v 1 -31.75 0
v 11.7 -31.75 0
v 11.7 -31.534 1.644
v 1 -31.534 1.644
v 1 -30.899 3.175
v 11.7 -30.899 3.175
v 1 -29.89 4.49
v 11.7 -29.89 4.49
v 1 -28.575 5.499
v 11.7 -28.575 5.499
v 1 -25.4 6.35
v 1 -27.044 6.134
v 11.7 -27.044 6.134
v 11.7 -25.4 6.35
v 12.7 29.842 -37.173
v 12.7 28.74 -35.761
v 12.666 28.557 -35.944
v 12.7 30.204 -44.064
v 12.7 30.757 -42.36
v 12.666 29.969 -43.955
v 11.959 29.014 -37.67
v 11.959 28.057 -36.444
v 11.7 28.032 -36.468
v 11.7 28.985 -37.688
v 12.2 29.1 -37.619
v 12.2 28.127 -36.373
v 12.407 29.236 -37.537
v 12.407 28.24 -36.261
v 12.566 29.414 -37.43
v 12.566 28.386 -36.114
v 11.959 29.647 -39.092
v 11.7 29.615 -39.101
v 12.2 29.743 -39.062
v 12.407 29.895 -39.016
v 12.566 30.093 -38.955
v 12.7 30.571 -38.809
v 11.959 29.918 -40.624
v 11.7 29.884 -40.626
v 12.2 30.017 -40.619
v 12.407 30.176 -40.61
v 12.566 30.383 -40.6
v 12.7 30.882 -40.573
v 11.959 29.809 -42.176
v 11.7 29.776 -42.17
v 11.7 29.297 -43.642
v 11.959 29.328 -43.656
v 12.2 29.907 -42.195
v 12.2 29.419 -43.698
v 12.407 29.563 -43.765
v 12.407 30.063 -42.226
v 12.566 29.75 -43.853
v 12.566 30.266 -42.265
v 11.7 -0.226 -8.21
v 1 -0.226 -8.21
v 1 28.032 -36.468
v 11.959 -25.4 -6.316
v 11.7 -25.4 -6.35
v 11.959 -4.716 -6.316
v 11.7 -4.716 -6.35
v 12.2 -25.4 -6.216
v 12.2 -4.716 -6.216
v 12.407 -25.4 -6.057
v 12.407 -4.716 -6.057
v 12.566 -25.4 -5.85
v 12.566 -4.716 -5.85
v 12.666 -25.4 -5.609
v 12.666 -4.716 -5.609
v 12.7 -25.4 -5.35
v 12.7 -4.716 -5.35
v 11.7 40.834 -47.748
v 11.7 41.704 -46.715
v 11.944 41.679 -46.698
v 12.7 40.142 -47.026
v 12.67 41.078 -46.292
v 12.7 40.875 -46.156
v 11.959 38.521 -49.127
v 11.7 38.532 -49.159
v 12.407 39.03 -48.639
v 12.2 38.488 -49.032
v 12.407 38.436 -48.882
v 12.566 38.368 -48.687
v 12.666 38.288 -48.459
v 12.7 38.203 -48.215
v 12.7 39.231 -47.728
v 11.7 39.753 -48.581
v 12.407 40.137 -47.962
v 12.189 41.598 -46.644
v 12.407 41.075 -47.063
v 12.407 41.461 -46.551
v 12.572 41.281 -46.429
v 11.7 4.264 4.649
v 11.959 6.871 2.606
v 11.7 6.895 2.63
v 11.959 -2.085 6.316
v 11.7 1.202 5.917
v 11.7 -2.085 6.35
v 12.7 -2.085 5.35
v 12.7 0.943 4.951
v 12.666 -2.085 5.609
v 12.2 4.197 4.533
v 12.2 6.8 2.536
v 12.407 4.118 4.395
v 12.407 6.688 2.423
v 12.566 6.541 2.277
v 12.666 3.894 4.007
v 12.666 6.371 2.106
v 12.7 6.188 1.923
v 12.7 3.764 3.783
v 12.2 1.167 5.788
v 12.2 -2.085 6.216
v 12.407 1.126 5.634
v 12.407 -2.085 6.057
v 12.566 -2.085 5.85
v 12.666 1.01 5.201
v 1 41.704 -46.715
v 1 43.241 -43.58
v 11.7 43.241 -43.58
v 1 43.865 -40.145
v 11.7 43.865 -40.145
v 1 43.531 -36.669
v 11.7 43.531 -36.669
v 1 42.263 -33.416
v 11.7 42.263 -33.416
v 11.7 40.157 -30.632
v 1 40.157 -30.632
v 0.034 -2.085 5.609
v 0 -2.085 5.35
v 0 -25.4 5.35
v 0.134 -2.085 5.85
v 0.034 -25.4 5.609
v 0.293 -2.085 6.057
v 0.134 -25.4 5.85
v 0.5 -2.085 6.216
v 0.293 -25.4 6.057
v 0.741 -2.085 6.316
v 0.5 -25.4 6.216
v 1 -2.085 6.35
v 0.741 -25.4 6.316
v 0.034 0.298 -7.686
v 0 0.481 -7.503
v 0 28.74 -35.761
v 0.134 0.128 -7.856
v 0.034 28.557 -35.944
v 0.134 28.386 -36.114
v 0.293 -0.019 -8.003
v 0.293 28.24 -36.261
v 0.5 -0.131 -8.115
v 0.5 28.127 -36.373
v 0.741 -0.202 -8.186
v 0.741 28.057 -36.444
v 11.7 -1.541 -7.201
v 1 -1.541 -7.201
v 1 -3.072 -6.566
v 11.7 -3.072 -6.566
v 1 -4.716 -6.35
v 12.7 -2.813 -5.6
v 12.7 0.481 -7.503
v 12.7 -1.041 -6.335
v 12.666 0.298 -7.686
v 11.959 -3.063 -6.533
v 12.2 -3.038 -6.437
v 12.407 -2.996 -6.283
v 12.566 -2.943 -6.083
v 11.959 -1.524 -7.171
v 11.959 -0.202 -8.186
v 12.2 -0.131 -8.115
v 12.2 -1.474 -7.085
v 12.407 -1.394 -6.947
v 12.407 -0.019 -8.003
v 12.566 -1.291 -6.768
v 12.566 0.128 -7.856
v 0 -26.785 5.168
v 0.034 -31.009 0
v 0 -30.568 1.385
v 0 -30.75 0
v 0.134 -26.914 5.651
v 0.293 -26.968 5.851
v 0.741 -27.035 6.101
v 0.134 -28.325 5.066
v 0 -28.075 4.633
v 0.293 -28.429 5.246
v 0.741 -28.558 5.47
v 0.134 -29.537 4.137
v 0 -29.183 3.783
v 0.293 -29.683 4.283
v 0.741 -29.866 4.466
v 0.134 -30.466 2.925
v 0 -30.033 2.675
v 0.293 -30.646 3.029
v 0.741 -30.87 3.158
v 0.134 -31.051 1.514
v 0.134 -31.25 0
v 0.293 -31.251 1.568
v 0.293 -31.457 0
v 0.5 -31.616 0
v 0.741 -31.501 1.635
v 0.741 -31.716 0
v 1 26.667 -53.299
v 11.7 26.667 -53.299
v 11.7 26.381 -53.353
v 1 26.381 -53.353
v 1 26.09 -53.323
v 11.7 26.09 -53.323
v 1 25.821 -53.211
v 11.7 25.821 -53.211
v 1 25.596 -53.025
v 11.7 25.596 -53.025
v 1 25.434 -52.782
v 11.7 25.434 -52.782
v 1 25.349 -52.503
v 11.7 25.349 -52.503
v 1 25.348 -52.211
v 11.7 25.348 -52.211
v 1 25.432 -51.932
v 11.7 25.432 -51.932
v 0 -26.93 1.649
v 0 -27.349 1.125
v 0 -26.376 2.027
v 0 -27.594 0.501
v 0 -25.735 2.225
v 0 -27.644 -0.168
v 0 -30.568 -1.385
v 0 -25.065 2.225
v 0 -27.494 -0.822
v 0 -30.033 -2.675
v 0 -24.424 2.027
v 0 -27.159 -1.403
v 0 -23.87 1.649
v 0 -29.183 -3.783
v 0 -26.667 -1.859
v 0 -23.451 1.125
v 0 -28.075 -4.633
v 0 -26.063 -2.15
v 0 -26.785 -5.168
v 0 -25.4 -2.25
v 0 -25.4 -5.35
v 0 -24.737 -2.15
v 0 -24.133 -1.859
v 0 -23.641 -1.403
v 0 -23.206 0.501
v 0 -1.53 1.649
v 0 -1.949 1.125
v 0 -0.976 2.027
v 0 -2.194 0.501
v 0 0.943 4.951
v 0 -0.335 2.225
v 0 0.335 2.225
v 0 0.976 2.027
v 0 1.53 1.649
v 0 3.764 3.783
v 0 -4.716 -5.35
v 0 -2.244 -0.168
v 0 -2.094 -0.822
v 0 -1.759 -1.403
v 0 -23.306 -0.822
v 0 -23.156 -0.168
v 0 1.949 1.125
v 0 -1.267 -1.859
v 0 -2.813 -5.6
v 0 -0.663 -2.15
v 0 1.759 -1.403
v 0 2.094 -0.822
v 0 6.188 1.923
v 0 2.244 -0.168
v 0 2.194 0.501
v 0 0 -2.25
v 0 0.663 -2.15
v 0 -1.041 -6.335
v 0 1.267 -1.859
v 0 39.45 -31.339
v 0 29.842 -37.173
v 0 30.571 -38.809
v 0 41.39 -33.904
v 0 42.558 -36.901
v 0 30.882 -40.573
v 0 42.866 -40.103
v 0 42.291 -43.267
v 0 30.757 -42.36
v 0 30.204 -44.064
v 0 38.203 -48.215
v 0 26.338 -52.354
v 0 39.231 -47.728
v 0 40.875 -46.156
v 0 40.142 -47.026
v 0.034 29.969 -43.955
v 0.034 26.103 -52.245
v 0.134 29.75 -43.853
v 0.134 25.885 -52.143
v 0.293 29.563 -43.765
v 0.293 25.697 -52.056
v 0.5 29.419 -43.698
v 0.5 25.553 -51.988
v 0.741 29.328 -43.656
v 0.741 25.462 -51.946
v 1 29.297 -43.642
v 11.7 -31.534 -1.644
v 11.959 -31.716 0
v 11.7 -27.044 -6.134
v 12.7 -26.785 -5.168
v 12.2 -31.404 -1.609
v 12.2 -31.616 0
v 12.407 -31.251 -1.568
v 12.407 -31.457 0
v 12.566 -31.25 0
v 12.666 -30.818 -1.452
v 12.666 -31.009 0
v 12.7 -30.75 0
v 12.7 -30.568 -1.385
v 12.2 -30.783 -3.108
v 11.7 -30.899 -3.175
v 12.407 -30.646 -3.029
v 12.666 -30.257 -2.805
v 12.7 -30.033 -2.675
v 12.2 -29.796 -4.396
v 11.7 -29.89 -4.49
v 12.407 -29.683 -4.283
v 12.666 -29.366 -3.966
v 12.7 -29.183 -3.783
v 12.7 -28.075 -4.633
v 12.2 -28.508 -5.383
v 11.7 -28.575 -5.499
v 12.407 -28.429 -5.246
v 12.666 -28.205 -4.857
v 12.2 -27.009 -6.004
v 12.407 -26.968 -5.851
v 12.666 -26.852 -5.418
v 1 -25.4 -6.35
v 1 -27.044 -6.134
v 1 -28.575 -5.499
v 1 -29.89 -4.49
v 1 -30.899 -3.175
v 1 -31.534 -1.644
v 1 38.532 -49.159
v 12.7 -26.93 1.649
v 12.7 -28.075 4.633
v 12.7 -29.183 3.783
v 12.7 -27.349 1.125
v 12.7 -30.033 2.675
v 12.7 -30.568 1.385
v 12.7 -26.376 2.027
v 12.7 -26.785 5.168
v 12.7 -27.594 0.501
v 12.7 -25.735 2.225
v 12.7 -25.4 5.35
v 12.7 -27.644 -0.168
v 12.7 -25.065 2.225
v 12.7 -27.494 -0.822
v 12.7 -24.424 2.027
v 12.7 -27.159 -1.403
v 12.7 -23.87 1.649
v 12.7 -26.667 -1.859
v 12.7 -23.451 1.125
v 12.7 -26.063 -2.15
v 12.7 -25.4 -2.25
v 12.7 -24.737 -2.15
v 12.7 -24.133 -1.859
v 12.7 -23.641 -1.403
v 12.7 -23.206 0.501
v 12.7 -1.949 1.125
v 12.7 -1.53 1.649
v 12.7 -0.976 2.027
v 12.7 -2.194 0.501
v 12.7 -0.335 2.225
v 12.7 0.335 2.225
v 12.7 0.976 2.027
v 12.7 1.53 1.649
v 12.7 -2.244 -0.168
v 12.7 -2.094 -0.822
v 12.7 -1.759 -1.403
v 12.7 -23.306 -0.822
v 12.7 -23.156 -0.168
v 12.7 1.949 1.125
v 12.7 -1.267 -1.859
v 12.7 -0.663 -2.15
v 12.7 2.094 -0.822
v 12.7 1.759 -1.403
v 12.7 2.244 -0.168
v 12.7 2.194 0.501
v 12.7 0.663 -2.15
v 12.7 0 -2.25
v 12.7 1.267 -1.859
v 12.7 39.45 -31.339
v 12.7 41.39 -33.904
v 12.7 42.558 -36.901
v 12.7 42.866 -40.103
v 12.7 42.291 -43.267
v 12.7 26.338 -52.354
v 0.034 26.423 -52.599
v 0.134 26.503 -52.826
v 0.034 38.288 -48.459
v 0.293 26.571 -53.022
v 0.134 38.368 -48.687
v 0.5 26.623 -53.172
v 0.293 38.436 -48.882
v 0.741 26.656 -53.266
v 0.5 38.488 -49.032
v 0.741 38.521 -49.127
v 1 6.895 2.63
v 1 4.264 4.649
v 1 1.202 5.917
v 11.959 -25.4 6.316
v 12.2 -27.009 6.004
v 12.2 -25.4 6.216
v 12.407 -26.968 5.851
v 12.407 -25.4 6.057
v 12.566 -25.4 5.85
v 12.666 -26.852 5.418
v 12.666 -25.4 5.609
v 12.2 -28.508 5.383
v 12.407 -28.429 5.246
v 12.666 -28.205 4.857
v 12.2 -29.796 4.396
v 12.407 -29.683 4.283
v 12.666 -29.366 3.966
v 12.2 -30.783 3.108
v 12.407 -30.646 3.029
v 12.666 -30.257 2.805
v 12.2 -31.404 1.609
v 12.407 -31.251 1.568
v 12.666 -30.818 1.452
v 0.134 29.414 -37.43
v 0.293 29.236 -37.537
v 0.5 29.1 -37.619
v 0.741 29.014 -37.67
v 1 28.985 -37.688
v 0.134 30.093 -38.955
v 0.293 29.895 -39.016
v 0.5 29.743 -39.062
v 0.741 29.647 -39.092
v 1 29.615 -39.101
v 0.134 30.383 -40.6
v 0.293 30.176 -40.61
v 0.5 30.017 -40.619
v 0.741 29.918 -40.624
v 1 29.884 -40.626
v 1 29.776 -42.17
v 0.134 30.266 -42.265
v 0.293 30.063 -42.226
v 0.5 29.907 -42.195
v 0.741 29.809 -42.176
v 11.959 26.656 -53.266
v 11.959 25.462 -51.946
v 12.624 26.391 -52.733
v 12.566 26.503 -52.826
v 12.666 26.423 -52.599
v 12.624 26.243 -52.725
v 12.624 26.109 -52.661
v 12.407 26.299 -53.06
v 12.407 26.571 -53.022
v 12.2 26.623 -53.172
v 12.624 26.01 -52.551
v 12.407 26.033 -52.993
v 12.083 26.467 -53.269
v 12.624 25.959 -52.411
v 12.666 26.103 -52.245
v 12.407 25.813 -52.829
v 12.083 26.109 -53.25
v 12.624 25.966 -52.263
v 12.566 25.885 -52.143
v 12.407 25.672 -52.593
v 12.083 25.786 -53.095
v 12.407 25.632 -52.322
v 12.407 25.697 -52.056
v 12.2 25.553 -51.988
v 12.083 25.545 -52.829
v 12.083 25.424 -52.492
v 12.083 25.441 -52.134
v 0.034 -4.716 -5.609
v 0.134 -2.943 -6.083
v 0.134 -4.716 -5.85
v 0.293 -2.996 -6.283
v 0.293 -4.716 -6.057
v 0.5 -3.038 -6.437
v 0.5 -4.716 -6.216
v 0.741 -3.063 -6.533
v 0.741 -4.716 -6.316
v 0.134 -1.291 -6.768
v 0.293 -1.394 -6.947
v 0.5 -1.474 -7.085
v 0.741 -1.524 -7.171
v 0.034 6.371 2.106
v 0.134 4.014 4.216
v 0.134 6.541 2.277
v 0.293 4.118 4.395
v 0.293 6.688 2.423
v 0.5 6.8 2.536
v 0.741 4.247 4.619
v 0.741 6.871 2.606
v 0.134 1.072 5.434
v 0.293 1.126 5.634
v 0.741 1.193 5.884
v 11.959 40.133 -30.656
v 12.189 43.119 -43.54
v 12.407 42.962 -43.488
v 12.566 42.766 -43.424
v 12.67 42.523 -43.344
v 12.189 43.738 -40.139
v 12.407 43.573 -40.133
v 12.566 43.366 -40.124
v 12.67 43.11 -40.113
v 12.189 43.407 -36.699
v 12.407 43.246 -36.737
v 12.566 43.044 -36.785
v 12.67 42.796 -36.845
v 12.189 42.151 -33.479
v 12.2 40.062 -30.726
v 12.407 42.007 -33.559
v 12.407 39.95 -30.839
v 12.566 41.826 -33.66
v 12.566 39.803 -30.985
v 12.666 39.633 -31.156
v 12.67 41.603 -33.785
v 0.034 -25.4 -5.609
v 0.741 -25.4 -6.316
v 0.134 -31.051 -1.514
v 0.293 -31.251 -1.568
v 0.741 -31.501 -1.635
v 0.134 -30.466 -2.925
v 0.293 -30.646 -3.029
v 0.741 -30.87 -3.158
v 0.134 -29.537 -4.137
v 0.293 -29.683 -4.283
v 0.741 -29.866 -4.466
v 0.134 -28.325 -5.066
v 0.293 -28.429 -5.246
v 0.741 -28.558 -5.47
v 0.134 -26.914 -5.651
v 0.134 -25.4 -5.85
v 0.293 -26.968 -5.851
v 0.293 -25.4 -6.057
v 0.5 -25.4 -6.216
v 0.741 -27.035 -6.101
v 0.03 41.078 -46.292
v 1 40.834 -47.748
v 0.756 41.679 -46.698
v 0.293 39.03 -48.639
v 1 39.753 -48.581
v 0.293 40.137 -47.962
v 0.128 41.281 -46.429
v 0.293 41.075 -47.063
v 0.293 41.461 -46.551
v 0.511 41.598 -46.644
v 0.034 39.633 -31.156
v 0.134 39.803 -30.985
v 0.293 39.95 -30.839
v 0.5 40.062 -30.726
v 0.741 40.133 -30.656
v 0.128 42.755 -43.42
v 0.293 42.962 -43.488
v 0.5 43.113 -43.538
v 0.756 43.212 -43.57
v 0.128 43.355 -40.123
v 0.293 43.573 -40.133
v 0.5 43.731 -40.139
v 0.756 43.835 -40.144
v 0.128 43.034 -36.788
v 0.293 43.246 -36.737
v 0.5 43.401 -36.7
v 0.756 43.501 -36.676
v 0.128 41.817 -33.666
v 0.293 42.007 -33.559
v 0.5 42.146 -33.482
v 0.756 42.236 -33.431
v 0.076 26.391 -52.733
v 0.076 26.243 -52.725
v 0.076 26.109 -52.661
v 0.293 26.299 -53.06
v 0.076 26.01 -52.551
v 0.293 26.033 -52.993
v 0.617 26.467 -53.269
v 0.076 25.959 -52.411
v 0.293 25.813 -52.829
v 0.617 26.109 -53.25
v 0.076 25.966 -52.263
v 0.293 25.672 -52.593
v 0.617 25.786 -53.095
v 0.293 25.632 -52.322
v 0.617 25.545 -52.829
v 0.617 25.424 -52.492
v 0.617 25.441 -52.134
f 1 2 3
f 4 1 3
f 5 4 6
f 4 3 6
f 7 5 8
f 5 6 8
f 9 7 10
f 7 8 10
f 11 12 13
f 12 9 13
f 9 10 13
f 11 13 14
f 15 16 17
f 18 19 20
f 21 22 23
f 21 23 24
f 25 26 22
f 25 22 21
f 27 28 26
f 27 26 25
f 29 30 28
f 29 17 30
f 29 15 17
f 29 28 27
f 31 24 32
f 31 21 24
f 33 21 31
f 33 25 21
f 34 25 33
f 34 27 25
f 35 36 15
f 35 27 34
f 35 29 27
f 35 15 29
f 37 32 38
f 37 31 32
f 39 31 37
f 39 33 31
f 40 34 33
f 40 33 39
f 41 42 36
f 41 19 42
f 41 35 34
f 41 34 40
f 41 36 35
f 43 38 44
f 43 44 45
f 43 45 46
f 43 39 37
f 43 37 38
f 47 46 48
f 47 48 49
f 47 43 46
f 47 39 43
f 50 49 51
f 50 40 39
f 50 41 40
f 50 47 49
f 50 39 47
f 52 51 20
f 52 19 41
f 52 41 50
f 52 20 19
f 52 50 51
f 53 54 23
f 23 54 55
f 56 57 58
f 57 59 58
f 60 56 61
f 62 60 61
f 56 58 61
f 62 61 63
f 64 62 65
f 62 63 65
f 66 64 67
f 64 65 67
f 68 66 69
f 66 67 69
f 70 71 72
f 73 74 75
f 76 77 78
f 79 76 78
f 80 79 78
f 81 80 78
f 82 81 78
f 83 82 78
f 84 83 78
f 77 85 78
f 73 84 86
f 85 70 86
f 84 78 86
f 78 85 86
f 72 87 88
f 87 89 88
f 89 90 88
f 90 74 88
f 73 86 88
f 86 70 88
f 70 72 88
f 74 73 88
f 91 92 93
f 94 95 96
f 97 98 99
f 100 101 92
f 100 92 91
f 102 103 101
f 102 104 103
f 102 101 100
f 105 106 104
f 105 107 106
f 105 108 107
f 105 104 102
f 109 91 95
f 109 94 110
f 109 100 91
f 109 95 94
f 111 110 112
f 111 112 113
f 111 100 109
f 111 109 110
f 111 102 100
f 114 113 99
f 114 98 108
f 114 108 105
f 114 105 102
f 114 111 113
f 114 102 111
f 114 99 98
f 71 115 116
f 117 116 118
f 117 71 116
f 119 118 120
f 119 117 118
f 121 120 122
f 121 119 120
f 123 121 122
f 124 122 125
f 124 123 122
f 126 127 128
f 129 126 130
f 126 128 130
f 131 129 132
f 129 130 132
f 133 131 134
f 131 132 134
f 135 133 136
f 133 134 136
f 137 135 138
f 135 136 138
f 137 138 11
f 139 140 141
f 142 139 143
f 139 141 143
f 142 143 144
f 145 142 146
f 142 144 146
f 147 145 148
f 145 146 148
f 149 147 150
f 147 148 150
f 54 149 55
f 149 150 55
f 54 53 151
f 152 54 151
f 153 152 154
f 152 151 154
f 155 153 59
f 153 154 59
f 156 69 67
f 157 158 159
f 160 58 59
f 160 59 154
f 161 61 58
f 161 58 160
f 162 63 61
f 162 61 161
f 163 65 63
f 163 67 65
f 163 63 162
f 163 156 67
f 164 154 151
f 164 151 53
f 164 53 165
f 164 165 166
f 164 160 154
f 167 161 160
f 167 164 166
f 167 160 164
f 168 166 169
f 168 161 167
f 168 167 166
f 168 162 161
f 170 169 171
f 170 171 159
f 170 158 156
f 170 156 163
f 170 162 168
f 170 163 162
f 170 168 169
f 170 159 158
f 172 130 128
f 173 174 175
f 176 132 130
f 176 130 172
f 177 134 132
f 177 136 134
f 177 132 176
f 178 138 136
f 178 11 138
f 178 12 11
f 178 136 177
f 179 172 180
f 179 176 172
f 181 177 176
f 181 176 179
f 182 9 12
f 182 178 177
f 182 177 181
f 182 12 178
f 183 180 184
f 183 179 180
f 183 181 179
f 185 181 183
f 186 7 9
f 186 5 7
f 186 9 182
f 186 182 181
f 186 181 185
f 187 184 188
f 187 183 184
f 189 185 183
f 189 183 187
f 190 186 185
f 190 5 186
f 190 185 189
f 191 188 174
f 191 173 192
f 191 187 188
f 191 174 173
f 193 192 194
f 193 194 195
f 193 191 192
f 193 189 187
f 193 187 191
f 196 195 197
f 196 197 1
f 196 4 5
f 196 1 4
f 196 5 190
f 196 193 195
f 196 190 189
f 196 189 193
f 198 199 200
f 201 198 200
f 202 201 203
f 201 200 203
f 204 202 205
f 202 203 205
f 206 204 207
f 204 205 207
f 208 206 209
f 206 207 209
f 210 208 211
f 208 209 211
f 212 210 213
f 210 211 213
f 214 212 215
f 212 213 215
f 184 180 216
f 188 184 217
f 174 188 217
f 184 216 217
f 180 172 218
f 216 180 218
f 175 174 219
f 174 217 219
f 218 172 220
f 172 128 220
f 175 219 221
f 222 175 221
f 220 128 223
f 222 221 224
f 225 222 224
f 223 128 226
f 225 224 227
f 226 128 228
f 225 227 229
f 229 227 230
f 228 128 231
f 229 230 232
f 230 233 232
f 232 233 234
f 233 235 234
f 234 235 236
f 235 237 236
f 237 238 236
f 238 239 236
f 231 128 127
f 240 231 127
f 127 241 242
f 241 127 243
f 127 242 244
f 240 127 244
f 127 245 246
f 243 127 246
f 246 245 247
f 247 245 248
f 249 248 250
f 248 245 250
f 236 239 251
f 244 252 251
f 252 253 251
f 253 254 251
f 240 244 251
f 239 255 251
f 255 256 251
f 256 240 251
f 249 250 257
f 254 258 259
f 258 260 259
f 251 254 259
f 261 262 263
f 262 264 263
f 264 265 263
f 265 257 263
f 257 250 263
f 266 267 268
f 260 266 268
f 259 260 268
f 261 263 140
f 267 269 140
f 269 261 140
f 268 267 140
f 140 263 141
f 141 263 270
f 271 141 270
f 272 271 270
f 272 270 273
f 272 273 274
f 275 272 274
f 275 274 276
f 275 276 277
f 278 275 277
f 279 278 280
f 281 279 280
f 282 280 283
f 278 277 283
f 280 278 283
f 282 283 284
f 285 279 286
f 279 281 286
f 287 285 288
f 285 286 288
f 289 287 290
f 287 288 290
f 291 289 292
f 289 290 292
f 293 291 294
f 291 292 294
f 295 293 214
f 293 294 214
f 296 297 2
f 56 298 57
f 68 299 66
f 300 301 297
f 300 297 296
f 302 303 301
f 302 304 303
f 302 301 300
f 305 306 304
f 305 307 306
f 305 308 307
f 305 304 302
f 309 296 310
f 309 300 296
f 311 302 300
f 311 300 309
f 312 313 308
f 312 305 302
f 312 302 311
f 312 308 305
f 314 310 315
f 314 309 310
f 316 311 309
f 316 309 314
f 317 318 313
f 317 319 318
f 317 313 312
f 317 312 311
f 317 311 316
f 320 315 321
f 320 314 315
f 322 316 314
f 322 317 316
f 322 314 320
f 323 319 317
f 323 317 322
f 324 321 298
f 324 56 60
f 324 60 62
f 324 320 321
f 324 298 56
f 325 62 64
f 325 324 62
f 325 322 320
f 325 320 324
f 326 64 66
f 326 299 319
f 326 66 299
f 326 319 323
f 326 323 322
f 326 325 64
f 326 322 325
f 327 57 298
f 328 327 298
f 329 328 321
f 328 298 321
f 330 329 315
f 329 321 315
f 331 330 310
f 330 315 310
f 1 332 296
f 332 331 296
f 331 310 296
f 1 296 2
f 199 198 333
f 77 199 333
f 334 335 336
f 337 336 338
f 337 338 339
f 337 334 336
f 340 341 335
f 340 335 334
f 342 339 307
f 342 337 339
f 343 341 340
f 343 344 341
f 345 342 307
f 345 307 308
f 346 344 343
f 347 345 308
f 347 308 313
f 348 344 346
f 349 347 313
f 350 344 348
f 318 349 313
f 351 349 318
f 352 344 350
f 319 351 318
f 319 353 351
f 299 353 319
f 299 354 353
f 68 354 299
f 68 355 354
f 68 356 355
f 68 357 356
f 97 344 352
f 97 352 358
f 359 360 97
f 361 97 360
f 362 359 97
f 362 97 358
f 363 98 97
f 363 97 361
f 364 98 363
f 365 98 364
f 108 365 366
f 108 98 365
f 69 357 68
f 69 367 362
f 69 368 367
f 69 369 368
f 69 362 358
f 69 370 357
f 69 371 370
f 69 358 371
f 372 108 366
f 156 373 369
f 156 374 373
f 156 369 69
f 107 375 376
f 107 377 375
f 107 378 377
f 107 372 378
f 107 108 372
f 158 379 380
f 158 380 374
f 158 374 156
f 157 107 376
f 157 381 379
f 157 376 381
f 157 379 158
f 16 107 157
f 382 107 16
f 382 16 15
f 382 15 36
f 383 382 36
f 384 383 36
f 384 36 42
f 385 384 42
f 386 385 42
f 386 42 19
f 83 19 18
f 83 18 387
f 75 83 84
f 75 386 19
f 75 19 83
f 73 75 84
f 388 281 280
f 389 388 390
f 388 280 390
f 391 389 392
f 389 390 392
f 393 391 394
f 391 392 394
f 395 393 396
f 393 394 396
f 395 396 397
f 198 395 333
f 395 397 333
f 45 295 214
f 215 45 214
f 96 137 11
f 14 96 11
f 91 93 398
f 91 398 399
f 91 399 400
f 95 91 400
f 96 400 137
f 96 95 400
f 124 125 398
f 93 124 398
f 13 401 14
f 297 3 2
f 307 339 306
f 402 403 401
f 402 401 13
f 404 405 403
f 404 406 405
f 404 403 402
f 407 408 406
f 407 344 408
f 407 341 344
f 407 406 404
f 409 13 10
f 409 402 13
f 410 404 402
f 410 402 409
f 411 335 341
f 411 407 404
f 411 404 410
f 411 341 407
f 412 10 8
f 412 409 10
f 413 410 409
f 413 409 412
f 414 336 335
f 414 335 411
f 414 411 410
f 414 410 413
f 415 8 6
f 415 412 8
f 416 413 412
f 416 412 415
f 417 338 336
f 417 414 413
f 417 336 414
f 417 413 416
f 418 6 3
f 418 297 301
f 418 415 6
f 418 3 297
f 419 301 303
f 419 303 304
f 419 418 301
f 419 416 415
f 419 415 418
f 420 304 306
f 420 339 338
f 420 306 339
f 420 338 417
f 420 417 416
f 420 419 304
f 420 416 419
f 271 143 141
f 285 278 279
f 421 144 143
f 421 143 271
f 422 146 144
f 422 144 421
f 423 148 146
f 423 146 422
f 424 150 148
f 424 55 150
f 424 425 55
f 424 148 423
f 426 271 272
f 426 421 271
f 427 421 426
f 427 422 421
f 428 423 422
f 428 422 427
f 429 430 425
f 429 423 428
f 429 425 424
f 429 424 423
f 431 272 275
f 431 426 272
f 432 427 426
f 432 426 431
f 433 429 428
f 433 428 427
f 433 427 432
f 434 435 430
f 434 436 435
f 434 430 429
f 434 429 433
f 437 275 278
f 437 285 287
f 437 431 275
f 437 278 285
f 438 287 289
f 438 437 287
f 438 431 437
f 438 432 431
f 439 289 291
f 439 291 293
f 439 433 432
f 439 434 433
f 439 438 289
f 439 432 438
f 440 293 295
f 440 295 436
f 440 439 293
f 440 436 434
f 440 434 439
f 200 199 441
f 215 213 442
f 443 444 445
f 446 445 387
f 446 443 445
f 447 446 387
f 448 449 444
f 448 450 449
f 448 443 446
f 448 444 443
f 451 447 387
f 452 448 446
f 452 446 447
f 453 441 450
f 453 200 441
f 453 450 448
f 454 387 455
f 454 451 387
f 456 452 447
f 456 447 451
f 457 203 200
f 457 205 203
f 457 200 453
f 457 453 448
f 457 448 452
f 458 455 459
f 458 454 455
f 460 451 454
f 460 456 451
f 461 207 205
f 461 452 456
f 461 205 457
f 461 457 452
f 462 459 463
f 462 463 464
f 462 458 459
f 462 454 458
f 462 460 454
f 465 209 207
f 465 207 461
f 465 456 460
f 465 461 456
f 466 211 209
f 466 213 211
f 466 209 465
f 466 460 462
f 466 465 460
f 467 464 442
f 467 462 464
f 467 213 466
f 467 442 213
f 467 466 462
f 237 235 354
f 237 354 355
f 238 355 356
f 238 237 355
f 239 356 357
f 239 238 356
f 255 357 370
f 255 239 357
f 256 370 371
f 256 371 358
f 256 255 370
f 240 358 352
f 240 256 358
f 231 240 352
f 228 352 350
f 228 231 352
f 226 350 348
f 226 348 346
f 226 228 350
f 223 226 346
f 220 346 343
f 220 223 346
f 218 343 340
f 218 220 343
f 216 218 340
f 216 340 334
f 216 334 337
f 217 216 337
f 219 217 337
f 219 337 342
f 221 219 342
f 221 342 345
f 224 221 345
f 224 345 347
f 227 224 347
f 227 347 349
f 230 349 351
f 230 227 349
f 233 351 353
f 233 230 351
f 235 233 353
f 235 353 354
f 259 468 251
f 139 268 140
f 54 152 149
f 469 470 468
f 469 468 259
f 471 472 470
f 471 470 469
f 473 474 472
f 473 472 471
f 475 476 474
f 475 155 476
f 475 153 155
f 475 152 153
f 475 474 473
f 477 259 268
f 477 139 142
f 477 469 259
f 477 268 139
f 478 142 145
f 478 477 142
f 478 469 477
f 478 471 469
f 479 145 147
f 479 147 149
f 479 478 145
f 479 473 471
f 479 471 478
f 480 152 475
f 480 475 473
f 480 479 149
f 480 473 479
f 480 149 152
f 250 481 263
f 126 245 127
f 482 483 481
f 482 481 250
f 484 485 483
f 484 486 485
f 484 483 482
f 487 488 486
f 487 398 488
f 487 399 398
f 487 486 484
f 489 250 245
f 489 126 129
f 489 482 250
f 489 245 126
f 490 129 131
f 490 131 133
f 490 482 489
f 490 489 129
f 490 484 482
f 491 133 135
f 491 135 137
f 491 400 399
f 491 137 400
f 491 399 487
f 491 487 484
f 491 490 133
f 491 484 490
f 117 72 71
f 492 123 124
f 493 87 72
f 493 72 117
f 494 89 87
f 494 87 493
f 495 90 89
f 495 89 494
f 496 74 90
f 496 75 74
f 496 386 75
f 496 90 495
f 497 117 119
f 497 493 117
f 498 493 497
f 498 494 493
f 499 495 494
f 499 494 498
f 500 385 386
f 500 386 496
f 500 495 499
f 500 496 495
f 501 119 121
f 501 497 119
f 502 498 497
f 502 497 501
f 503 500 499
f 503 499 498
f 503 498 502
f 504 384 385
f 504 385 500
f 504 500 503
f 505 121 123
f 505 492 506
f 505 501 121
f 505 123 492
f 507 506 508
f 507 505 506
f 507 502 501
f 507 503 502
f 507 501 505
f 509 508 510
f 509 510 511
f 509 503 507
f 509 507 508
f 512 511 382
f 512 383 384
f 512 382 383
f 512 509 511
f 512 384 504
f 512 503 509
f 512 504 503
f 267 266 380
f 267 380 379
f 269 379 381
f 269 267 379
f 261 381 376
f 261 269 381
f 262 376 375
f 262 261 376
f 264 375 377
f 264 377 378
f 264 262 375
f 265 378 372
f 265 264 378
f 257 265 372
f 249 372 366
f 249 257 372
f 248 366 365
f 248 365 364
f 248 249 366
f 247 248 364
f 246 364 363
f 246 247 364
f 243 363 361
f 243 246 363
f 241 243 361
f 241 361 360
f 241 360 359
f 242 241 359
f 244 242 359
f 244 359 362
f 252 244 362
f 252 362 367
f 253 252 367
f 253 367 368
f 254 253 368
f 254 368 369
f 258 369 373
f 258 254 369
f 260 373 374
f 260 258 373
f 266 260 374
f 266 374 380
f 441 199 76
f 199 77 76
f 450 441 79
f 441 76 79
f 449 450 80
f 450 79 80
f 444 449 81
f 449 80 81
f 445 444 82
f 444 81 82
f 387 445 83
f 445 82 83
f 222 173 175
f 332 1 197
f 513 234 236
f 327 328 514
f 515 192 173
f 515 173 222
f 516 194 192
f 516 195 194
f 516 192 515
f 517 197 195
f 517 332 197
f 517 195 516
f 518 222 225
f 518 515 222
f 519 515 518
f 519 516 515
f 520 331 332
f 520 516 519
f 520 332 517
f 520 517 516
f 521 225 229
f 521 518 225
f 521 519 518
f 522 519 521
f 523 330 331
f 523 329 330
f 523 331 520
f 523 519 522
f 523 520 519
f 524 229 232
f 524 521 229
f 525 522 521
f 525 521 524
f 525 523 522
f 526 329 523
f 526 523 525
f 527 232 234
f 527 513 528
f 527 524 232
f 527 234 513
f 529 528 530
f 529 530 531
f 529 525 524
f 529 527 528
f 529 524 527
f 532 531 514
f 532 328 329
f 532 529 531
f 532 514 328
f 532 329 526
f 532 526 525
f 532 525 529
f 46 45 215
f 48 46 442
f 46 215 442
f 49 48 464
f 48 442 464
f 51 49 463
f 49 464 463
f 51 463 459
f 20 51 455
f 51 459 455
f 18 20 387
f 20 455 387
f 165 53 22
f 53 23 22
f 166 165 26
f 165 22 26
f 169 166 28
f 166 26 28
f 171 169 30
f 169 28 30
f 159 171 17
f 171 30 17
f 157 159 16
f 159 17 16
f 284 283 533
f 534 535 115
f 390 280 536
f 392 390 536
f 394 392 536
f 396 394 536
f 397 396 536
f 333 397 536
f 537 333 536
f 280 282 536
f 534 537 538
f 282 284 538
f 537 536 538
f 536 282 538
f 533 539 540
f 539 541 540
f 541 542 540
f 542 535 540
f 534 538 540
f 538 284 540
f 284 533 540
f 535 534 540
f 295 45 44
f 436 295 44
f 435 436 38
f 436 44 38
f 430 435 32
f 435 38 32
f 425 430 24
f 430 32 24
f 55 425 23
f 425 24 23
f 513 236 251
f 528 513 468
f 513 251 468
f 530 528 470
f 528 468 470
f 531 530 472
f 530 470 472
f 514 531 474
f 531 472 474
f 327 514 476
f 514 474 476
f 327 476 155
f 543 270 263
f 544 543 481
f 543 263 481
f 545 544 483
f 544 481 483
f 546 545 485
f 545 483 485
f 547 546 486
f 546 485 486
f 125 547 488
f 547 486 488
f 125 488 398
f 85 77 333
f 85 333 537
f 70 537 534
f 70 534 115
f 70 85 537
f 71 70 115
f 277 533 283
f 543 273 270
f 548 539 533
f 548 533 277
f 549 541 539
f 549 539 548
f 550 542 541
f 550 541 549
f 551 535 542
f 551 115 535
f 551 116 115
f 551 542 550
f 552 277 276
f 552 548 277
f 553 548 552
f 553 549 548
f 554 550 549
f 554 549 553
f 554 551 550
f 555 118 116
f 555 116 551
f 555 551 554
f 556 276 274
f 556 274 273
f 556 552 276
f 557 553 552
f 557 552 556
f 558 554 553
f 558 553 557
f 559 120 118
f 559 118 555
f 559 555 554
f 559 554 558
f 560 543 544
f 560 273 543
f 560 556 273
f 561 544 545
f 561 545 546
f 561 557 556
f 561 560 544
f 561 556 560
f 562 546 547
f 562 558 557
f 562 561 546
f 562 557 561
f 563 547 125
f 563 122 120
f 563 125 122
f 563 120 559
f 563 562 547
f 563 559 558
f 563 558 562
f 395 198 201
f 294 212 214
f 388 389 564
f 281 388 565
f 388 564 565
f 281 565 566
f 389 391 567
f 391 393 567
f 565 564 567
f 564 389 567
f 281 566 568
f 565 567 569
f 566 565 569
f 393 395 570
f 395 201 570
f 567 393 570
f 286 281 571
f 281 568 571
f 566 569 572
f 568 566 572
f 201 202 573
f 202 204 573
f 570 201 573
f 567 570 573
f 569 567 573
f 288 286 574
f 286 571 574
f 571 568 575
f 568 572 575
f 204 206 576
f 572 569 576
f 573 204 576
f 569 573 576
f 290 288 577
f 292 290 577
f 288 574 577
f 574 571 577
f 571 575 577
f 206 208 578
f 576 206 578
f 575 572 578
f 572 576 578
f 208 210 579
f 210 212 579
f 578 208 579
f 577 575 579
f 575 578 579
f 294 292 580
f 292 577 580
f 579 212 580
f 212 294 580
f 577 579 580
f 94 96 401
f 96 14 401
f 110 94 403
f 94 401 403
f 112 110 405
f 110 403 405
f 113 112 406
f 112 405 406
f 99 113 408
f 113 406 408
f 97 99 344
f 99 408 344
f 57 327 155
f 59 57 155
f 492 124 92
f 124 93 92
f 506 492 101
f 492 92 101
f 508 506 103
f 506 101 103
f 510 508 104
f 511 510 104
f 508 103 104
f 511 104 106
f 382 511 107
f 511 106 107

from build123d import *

# Parameters (mm, degrees)
SKETCH1_R           = 2.25
BOSS_EXTRUDE1_DEPTH = 12.7
FILLET1_R           = 12.7
FILLET2_R           = 6.35
FILLET3_R           = 1


with BuildPart() as part:
    # Sketch1 → Boss-Extrude1 (new body)
    # profile 1 of 2: a face of its own
    with BuildSketch(Plane(origin=(0, 0, 0), x_dir=(0, 0, -1), z_dir=(1, 0, 0))):
        Polygon((48.592196898, 40.156684656), (39.611940777, 49.136940777), (-6.35, 3.175), (-6.35, -31.75), (6.35, -31.75), (6.35, -2.085512242), align=None)
        with Locations((0, -25.4)):
            Circle(SKETCH1_R, mode=Mode.SUBTRACT)
        Circle(SKETCH1_R, mode=Mode.SUBTRACT)
    # profile 2 of 2: a face of its own
    with BuildSketch(Plane(origin=(0, 0, 0), x_dir=(0, 0, -1), z_dir=(1, 0, 0))):
        Polygon((54.079029807, 24.430314129), (48.592196898, 40.156684656), (39.611940777, 31.176428535), align=None)
    extrude(amount=BOSS_EXTRUDE1_DEPTH)

    # Fillet1
    fillet1_edges = [part.edges().sort_by_distance(p)[0] for p in [
        (6.35, 3.175, 6.35),
        (6.35, 49.136940777, -39.611940777),
    ]]
    fillet(fillet1_edges, radius=FILLET1_R - 0.0001)  # a hair under: the kernel refuses the full size

    # Fillet2
    fillet2_edges = [part.edges().sort_by_distance(p)[0] for p in [
        (6.35, 31.176428535, -39.611940777),
        (6.35, -2.085512242, -6.35),
    ]]
    fillet(fillet2_edges, radius=FILLET2_R)
    fillet2_2_edges = [part.edges().sort_by_distance(p)[0] for p in [
        (6.35, 40.156684656, -48.592196898),
        (6.35, -31.75, 6.35),
        (6.35, -31.75, -6.35),
    ]]
    fillet(fillet2_2_edges, radius=FILLET2_R - 0.0004)  # a hair under: the kernel refuses the full size

    # Fillet3
    fillet3_edges = [part.edges().sort_by_distance(p)[0] for p in [
        (0, 26.863823768, -48.860351546),
        (6.35, 24.430314129, -54.079029807),
        (0, -13.74293541, 6.35),
        (12.7, -13.74293541, 6.35),
        (0, 23.525734978, -14.000734978),
        (0, 43.818086311, -38.395583818),
        (0, 2.774570502, 5.383277675),
        (12.7, 23.525734978, -14.000734978),
        (12.7, 2.774570502, 5.383277675),
        (12.7, 43.818086311, -38.395583818),
        (0, 31.48135692, -51.618964812),
        (0, 13.903383358, -22.338895601),
        (12.7, 26.863823768, -48.860351546),
        (0, -15.058084182, -6.35),
        (0, -29.890245218, -4.490245218),
        (0, -29.890245218, 4.490245218),
        (0, 40.316018936, -48.193567347),
        (12.7, 31.48135692, -51.618964812),
        (12.7, -15.058084182, -6.35),
        (12.7, 13.903383358, -22.338895601),
        (12.7, -29.890245218, -4.490245218),
        (12.7, -29.890245218, 4.490245218),
        (12.7, 40.316018936, -48.193567347),
        (0, 29.795808191, -39.855381394),
        (12.7, 29.795808191, -39.855381394),
        (0, -2.285728568, -6.833364969),
        (12.7, -2.285728568, -6.833364969),
    ]]
    fillet(fillet3_edges, radius=FILLET3_R)


solid = part.part
